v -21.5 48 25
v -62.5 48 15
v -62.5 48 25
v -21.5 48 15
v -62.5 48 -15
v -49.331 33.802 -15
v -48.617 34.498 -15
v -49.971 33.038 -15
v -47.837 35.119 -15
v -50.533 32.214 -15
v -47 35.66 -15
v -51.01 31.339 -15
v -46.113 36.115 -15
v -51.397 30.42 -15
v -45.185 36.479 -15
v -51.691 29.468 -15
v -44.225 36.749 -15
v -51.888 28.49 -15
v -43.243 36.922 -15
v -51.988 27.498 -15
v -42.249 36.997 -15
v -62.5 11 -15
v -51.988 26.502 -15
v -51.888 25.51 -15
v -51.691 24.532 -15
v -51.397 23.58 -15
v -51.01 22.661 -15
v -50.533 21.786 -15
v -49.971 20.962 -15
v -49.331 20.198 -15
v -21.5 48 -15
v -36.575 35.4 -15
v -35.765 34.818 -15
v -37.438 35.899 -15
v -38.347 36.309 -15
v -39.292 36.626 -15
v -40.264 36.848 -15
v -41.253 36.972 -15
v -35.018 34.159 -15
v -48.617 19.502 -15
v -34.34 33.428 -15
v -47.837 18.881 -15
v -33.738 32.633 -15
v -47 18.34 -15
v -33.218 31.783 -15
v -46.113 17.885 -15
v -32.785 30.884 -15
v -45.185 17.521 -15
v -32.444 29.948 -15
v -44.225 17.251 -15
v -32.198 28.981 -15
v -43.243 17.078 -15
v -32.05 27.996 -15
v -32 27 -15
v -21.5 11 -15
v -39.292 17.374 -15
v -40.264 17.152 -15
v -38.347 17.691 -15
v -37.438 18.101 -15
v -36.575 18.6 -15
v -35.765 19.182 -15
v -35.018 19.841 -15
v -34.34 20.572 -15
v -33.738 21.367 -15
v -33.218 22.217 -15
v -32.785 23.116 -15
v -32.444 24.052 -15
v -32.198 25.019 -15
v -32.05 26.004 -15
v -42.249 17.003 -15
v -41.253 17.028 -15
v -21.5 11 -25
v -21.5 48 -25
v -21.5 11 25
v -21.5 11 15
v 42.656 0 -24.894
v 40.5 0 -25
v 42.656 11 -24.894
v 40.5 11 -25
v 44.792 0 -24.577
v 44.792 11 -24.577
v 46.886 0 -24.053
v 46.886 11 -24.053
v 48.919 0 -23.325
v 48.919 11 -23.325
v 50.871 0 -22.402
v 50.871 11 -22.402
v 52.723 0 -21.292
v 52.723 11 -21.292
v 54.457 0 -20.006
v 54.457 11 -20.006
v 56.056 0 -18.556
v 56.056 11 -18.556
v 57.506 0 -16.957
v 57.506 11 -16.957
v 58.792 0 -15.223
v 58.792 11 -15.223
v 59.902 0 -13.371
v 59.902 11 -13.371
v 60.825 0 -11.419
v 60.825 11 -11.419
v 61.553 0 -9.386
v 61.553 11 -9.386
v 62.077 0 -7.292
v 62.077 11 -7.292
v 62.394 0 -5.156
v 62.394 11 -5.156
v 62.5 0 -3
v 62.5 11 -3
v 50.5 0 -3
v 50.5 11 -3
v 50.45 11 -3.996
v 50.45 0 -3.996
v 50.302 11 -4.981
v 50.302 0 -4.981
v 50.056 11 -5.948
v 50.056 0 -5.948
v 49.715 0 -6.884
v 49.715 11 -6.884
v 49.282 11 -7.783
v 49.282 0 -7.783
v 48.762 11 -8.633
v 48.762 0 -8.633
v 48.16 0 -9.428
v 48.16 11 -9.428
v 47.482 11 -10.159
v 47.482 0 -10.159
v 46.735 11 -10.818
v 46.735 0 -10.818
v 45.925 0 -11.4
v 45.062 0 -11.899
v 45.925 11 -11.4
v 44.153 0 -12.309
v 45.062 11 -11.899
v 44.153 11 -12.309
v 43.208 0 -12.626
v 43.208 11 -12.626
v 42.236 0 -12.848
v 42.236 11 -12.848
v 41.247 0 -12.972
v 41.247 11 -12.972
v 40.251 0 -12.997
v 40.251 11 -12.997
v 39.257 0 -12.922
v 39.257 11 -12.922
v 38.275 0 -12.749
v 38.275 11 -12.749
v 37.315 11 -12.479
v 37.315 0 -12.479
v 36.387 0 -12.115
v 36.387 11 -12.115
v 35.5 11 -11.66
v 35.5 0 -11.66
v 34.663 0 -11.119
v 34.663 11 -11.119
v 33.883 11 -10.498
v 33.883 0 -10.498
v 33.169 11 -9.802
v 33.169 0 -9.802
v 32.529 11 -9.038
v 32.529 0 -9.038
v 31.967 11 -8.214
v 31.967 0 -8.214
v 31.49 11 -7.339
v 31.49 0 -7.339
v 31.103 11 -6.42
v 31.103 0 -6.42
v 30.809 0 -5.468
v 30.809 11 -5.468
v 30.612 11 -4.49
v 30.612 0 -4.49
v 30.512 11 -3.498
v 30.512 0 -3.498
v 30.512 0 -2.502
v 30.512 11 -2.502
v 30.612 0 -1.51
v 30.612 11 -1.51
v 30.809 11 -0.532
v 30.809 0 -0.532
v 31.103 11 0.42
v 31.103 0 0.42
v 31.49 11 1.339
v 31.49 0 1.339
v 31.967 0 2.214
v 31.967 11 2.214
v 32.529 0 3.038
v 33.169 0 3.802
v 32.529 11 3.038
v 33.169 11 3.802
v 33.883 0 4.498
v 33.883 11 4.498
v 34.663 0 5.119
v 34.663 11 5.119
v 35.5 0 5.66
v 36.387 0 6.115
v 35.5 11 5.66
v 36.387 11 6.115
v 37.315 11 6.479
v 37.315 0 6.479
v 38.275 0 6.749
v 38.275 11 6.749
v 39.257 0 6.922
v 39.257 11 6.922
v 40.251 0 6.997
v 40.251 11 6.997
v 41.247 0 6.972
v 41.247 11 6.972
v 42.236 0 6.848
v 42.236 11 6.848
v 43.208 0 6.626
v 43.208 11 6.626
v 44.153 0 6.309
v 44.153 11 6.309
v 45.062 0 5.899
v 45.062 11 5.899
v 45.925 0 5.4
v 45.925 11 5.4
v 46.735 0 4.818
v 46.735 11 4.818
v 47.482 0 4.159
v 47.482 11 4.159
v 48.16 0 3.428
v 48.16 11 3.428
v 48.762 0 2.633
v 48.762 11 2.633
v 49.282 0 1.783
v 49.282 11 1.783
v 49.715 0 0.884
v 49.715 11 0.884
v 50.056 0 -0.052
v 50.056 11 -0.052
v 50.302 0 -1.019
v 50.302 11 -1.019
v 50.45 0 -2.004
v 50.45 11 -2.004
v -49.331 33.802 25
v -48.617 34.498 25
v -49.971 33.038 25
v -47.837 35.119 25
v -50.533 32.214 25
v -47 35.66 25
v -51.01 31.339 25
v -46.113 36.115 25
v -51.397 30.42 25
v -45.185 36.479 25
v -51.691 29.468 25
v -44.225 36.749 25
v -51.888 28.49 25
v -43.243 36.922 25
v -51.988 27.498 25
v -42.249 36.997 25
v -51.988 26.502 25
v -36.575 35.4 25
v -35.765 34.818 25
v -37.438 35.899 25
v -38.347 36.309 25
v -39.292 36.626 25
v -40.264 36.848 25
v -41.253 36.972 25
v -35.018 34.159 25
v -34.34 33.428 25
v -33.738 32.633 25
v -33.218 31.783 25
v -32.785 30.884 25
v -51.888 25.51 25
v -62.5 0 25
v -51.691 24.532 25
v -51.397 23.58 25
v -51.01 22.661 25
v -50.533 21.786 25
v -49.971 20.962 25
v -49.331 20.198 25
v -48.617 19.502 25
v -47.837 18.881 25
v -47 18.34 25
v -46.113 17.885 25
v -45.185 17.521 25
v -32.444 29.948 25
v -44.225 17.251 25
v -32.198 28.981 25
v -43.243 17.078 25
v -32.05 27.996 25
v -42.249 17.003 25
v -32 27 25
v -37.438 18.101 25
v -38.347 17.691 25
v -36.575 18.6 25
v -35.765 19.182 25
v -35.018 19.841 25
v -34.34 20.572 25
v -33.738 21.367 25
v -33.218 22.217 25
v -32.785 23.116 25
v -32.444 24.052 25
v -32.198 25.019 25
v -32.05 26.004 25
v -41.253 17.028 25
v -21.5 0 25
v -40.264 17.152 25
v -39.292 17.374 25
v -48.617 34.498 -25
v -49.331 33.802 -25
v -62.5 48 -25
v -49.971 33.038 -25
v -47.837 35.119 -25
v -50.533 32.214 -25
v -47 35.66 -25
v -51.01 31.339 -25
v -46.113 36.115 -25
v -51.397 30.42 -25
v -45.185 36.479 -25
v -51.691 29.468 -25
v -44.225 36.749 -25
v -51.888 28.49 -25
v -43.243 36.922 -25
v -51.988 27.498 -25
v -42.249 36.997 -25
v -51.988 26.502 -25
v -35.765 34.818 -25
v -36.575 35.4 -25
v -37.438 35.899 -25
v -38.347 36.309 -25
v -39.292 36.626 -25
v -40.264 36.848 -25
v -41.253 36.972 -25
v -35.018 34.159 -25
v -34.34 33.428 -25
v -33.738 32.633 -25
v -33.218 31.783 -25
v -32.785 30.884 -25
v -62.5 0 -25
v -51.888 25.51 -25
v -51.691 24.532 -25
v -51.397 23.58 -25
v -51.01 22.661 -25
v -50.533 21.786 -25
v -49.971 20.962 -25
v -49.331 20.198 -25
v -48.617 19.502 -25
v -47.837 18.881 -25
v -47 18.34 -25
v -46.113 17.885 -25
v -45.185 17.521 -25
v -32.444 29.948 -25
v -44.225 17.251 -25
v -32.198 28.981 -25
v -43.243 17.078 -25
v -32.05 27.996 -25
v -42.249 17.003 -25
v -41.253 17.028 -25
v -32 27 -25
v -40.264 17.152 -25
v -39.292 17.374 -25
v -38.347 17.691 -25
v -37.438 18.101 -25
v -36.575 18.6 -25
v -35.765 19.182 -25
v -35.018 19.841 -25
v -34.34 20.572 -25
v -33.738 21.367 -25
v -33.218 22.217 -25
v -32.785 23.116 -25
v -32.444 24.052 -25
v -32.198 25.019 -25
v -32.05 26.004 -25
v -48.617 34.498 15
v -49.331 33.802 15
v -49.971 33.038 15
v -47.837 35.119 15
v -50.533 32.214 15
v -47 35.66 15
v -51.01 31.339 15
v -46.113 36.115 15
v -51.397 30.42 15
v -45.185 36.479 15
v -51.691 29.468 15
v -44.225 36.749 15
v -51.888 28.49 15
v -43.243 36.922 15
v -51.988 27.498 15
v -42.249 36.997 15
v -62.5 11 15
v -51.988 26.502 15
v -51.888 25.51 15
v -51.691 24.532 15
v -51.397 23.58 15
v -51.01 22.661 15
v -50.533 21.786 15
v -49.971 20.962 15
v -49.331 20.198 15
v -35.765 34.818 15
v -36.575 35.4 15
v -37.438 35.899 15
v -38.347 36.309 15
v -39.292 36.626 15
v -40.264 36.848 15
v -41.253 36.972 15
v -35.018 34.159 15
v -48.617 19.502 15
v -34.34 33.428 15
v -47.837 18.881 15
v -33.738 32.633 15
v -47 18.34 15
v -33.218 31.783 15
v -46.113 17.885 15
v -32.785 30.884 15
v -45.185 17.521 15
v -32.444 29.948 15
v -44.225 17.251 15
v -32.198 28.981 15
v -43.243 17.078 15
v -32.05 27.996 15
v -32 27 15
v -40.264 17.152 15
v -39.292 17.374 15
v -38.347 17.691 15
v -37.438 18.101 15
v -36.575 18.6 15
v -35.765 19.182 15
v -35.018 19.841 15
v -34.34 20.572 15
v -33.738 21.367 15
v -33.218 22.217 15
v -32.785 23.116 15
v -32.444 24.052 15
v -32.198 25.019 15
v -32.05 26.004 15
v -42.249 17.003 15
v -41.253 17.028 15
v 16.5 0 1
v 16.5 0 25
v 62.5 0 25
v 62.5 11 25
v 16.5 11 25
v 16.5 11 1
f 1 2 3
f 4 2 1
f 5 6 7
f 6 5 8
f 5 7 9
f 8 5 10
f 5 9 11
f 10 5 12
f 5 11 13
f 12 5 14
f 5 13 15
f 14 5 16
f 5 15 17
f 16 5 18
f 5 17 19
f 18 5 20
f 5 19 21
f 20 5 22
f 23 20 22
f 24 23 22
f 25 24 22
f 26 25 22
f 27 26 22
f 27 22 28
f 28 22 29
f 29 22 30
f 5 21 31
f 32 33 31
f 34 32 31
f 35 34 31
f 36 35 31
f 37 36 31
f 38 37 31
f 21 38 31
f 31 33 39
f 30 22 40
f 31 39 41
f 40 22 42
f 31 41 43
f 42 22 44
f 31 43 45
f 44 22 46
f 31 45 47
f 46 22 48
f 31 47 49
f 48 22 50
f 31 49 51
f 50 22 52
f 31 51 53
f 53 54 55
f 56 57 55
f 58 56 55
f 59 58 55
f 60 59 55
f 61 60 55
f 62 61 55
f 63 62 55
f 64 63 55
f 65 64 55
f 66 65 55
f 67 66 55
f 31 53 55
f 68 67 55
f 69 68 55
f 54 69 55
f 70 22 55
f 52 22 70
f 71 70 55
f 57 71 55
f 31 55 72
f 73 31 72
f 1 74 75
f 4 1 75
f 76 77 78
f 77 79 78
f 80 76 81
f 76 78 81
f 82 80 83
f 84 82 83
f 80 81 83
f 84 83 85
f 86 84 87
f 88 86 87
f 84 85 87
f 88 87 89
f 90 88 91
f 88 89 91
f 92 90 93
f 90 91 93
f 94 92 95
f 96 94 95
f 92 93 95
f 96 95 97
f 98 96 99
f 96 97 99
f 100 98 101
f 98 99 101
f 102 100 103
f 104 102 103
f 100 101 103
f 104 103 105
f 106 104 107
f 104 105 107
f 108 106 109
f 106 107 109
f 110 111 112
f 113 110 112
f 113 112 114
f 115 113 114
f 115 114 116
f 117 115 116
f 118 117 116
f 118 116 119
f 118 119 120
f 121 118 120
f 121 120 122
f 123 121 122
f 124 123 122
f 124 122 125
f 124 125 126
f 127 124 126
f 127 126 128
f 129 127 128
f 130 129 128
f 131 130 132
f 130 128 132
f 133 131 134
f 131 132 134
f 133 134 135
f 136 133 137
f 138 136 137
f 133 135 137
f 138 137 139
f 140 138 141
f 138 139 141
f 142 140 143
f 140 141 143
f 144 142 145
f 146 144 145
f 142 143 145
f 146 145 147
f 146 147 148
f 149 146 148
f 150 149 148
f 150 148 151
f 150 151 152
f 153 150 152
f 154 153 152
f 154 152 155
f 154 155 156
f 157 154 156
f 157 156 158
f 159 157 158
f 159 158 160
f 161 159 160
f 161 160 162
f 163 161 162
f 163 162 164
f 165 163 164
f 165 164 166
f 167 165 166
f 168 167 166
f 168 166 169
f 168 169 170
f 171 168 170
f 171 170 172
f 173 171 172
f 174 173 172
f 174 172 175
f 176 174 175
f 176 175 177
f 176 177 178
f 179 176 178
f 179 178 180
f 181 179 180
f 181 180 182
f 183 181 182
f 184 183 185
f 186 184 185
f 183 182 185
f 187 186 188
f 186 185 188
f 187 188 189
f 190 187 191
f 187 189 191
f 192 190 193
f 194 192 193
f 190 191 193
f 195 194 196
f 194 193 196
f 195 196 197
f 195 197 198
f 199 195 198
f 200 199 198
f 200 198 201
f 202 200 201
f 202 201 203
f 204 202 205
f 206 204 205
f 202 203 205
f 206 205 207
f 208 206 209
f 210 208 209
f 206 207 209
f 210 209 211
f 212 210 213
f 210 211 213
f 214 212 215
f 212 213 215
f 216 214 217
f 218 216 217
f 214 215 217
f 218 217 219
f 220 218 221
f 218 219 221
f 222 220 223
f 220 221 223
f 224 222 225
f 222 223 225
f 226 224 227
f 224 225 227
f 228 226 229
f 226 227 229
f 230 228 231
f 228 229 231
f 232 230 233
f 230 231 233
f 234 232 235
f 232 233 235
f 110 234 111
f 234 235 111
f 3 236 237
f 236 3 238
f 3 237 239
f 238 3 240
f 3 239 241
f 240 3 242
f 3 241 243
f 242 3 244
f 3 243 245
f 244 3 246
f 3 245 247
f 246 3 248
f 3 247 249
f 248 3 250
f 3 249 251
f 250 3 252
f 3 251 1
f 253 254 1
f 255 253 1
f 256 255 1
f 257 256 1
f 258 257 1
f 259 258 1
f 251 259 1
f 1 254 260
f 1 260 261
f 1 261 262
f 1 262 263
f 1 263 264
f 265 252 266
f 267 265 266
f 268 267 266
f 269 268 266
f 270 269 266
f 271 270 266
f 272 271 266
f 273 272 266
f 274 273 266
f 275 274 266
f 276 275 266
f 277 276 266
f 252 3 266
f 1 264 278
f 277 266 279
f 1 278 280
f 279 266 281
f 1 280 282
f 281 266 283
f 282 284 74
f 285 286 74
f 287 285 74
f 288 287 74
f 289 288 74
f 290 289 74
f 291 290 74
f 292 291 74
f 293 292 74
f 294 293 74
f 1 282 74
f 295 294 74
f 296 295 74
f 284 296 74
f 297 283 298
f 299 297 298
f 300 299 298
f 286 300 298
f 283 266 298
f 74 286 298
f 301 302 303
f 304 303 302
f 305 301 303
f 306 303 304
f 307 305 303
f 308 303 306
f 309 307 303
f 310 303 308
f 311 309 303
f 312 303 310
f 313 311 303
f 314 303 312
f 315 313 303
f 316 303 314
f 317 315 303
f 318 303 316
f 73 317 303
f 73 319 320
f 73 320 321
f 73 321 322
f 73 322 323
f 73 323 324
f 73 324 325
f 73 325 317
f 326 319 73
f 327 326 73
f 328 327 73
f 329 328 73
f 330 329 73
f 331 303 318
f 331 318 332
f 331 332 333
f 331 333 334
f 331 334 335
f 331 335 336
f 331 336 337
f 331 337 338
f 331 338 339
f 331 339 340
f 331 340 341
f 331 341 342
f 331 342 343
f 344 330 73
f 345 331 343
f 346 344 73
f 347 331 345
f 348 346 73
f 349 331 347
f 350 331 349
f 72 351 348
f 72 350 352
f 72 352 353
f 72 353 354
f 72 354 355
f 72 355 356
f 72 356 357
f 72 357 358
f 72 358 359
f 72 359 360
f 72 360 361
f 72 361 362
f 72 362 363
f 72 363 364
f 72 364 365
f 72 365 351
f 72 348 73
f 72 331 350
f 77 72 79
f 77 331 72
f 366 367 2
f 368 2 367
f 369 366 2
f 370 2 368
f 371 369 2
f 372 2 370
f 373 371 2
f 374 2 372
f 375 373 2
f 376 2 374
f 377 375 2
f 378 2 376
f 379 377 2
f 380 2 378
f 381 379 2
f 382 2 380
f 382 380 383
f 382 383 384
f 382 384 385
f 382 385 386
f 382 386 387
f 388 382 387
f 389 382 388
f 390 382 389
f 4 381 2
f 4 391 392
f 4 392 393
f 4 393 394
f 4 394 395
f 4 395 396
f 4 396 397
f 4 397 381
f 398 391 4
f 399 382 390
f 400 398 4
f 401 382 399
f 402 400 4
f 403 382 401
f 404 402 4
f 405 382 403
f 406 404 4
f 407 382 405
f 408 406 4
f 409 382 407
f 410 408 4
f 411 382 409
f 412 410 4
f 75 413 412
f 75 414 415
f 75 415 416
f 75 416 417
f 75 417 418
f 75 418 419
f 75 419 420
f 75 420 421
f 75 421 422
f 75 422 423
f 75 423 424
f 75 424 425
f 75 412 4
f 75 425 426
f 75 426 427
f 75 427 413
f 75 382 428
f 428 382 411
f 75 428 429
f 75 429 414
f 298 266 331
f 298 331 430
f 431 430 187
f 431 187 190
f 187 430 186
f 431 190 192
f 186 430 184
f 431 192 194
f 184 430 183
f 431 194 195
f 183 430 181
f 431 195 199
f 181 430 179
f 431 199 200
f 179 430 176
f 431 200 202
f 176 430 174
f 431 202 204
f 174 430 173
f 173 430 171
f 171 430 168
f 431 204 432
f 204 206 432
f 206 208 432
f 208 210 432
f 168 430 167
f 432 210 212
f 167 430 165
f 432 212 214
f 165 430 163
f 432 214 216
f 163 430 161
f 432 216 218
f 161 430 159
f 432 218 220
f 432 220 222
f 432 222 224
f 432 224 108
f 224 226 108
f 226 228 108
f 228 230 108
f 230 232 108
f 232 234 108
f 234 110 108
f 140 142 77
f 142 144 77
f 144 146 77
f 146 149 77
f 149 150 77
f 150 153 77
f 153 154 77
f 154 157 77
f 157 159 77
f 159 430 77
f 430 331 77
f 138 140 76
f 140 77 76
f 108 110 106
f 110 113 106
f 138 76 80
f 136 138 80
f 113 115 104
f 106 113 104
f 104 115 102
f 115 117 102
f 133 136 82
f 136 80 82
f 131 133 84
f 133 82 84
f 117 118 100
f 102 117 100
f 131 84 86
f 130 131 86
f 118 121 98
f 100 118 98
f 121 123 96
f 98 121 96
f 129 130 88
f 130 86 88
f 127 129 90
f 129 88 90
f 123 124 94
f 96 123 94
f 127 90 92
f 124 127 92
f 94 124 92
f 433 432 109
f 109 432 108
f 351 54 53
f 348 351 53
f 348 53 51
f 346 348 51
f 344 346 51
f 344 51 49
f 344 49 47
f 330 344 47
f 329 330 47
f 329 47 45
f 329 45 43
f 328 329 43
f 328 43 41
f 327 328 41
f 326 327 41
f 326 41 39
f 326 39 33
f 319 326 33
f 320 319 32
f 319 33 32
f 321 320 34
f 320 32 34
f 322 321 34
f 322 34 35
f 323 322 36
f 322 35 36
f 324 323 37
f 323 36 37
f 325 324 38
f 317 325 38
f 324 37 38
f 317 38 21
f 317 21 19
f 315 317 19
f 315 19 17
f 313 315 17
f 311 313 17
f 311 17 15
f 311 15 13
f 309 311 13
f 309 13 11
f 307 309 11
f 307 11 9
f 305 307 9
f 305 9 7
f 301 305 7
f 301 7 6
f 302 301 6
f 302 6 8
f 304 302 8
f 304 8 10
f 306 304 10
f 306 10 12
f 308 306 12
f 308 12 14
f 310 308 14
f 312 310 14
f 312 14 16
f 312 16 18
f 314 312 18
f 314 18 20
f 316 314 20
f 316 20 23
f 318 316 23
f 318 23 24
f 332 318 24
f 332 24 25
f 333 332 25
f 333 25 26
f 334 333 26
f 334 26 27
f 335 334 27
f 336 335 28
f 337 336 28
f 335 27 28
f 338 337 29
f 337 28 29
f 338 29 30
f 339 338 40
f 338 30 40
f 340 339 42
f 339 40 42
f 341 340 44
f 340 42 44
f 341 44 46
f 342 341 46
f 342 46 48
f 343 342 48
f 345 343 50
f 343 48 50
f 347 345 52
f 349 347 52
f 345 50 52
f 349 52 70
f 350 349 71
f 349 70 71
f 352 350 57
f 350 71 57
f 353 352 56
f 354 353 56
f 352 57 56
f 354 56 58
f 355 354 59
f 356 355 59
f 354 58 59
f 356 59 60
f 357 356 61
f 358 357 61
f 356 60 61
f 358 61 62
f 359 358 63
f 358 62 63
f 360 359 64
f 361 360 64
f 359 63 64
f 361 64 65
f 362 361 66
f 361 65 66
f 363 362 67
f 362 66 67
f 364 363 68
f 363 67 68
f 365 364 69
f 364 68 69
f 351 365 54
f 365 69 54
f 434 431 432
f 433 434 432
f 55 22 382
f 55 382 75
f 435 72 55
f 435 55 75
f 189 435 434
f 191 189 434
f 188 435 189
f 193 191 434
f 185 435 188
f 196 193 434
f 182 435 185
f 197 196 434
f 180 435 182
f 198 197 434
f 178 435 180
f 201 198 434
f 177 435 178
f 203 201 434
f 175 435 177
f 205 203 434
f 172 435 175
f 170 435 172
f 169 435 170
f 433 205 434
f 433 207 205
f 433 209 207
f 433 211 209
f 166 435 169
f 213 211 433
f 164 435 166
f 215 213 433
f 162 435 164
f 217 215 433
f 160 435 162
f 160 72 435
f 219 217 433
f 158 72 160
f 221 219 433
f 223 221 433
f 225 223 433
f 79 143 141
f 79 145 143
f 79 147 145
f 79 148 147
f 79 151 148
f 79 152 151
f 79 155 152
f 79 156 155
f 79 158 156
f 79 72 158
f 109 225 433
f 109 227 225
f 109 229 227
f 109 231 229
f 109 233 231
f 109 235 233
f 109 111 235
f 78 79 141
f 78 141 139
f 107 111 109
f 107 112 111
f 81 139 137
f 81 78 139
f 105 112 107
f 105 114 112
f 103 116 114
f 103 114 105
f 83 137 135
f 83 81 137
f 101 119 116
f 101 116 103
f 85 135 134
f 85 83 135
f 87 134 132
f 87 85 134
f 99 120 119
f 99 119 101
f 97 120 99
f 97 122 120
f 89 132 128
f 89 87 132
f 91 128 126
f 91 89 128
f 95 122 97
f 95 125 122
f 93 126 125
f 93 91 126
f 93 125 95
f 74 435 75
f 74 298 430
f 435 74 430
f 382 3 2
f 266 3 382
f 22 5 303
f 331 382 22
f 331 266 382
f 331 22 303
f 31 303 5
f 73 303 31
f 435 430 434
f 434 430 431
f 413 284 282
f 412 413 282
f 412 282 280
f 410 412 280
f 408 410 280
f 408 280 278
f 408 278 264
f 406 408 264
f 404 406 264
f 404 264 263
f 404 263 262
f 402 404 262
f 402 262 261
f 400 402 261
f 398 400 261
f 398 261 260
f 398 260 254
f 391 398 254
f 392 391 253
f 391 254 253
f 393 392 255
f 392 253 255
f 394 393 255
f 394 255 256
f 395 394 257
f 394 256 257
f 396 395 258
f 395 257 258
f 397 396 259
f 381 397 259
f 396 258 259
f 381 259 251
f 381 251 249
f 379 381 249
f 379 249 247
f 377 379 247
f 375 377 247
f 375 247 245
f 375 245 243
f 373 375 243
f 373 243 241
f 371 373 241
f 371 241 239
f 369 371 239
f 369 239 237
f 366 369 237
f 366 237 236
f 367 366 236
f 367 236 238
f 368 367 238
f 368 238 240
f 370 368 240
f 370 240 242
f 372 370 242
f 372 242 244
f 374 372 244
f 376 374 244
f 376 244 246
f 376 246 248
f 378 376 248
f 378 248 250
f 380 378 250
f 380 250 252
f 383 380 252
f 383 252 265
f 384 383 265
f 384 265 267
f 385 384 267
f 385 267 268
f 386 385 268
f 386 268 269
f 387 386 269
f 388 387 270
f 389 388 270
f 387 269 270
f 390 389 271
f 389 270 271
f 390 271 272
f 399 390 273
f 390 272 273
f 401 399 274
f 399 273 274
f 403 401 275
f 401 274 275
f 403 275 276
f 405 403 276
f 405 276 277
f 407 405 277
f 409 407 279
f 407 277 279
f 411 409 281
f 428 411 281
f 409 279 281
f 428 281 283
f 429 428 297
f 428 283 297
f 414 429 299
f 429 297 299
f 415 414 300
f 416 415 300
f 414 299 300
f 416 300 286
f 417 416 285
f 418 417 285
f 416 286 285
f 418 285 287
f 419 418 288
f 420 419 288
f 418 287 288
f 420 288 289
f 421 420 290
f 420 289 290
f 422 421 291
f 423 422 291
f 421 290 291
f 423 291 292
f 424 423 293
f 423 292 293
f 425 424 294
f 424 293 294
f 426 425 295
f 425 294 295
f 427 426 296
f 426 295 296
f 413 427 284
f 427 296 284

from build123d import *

# Parameters (mm, degrees)
BOSS_EXTRUDE1_DEPTH = 11
SKETCH2_R           = 10
CUT_EXTRUDE1_DEPTH  = 12
SKETCH3_W           = 41
SKETCH3_H           = 10
BOSS_EXTRUDE2_DEPTH = 37
SKETCH4_R           = 10
CUT_EXTRUDE2_DEPTH  = 51
FILLET4_R           = 22


with BuildPart() as part:
    # Sketch1 → Boss-Extrude1 (new body)
    with BuildSketch(Plane(origin=(0, 0, 0), x_dir=(1, 0, 0), z_dir=(0, 1, 0))):
        Polygon((16.5, -25), (62.5, -25), (62.5, 25), (-62.5, 25), (-62.5, -25), (-21.5, -25), (16.5, -1), align=None)
    extrude(amount=BOSS_EXTRUDE1_DEPTH)

    # Sketch2 → Cut-Extrude1 (cut, through all)
    with BuildSketch(Plane(origin=(0, 11, 0), x_dir=(1, 0, 0), z_dir=(0, 1, 0))):
        with Locations((40.5, 3)):
            Circle(SKETCH2_R)
    extrude(amount=-CUT_EXTRUDE1_DEPTH, mode=Mode.SUBTRACT)

    # Sketch3 → Boss-Extrude2 (add)
    with BuildSketch(Plane(origin=(0, 11, 0), x_dir=(1, 0, 0), z_dir=(0, 1, 0))):
        with Locations((-42, 20)):
            Rectangle(SKETCH3_W, SKETCH3_H)
        with Locations((-42, -20)):
            Rectangle(SKETCH3_W, SKETCH3_H)
    extrude(amount=BOSS_EXTRUDE2_DEPTH)

    # Sketch4 → Cut-Extrude2 (cut, through all)
    with BuildSketch(Plane.XY.offset(25)):
        with Locations((-42, 27)):
            Circle(SKETCH4_R)
    extrude(amount=-CUT_EXTRUDE2_DEPTH, mode=Mode.SUBTRACT)

    # Fillet4
    fillet4_edges = [part.edges().sort_by_distance(p)[0] for p in [
        (62.5, 5.5, -25),
    ]]
    fillet(fillet4_edges, radius=FILLET4_R)


solid = part.part
